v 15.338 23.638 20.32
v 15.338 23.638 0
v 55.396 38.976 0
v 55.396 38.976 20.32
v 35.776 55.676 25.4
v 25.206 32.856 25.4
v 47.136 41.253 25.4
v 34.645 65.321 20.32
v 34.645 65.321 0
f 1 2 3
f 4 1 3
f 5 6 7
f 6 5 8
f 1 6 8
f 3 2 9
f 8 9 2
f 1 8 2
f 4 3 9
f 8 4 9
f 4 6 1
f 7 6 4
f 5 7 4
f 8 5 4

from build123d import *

# Parameters (mm, degrees)
F2_DEPTH = 25.4
F3_SIZE  = 5.08


with BuildPart() as f2:
    # F1 (on face) → F2 (new body)
    with BuildSketch(Plane.XY):
        Polygon((15.33778, 23.638219), (55.396467, 38.976014), (34.645349, 65.320902), align=None)
    extrude(amount=F2_DEPTH)

    # F3
    f3_edges = [f2.edges().sort_by_distance(p)[0] for p in [
        (45.020908, 52.148458, 25.4),
        (24.991564, 44.47956, 25.4),
        (35.367124, 31.307116, 25.4),
    ]]
    chamfer(f3_edges, length=F3_SIZE)


solid = f2.part
